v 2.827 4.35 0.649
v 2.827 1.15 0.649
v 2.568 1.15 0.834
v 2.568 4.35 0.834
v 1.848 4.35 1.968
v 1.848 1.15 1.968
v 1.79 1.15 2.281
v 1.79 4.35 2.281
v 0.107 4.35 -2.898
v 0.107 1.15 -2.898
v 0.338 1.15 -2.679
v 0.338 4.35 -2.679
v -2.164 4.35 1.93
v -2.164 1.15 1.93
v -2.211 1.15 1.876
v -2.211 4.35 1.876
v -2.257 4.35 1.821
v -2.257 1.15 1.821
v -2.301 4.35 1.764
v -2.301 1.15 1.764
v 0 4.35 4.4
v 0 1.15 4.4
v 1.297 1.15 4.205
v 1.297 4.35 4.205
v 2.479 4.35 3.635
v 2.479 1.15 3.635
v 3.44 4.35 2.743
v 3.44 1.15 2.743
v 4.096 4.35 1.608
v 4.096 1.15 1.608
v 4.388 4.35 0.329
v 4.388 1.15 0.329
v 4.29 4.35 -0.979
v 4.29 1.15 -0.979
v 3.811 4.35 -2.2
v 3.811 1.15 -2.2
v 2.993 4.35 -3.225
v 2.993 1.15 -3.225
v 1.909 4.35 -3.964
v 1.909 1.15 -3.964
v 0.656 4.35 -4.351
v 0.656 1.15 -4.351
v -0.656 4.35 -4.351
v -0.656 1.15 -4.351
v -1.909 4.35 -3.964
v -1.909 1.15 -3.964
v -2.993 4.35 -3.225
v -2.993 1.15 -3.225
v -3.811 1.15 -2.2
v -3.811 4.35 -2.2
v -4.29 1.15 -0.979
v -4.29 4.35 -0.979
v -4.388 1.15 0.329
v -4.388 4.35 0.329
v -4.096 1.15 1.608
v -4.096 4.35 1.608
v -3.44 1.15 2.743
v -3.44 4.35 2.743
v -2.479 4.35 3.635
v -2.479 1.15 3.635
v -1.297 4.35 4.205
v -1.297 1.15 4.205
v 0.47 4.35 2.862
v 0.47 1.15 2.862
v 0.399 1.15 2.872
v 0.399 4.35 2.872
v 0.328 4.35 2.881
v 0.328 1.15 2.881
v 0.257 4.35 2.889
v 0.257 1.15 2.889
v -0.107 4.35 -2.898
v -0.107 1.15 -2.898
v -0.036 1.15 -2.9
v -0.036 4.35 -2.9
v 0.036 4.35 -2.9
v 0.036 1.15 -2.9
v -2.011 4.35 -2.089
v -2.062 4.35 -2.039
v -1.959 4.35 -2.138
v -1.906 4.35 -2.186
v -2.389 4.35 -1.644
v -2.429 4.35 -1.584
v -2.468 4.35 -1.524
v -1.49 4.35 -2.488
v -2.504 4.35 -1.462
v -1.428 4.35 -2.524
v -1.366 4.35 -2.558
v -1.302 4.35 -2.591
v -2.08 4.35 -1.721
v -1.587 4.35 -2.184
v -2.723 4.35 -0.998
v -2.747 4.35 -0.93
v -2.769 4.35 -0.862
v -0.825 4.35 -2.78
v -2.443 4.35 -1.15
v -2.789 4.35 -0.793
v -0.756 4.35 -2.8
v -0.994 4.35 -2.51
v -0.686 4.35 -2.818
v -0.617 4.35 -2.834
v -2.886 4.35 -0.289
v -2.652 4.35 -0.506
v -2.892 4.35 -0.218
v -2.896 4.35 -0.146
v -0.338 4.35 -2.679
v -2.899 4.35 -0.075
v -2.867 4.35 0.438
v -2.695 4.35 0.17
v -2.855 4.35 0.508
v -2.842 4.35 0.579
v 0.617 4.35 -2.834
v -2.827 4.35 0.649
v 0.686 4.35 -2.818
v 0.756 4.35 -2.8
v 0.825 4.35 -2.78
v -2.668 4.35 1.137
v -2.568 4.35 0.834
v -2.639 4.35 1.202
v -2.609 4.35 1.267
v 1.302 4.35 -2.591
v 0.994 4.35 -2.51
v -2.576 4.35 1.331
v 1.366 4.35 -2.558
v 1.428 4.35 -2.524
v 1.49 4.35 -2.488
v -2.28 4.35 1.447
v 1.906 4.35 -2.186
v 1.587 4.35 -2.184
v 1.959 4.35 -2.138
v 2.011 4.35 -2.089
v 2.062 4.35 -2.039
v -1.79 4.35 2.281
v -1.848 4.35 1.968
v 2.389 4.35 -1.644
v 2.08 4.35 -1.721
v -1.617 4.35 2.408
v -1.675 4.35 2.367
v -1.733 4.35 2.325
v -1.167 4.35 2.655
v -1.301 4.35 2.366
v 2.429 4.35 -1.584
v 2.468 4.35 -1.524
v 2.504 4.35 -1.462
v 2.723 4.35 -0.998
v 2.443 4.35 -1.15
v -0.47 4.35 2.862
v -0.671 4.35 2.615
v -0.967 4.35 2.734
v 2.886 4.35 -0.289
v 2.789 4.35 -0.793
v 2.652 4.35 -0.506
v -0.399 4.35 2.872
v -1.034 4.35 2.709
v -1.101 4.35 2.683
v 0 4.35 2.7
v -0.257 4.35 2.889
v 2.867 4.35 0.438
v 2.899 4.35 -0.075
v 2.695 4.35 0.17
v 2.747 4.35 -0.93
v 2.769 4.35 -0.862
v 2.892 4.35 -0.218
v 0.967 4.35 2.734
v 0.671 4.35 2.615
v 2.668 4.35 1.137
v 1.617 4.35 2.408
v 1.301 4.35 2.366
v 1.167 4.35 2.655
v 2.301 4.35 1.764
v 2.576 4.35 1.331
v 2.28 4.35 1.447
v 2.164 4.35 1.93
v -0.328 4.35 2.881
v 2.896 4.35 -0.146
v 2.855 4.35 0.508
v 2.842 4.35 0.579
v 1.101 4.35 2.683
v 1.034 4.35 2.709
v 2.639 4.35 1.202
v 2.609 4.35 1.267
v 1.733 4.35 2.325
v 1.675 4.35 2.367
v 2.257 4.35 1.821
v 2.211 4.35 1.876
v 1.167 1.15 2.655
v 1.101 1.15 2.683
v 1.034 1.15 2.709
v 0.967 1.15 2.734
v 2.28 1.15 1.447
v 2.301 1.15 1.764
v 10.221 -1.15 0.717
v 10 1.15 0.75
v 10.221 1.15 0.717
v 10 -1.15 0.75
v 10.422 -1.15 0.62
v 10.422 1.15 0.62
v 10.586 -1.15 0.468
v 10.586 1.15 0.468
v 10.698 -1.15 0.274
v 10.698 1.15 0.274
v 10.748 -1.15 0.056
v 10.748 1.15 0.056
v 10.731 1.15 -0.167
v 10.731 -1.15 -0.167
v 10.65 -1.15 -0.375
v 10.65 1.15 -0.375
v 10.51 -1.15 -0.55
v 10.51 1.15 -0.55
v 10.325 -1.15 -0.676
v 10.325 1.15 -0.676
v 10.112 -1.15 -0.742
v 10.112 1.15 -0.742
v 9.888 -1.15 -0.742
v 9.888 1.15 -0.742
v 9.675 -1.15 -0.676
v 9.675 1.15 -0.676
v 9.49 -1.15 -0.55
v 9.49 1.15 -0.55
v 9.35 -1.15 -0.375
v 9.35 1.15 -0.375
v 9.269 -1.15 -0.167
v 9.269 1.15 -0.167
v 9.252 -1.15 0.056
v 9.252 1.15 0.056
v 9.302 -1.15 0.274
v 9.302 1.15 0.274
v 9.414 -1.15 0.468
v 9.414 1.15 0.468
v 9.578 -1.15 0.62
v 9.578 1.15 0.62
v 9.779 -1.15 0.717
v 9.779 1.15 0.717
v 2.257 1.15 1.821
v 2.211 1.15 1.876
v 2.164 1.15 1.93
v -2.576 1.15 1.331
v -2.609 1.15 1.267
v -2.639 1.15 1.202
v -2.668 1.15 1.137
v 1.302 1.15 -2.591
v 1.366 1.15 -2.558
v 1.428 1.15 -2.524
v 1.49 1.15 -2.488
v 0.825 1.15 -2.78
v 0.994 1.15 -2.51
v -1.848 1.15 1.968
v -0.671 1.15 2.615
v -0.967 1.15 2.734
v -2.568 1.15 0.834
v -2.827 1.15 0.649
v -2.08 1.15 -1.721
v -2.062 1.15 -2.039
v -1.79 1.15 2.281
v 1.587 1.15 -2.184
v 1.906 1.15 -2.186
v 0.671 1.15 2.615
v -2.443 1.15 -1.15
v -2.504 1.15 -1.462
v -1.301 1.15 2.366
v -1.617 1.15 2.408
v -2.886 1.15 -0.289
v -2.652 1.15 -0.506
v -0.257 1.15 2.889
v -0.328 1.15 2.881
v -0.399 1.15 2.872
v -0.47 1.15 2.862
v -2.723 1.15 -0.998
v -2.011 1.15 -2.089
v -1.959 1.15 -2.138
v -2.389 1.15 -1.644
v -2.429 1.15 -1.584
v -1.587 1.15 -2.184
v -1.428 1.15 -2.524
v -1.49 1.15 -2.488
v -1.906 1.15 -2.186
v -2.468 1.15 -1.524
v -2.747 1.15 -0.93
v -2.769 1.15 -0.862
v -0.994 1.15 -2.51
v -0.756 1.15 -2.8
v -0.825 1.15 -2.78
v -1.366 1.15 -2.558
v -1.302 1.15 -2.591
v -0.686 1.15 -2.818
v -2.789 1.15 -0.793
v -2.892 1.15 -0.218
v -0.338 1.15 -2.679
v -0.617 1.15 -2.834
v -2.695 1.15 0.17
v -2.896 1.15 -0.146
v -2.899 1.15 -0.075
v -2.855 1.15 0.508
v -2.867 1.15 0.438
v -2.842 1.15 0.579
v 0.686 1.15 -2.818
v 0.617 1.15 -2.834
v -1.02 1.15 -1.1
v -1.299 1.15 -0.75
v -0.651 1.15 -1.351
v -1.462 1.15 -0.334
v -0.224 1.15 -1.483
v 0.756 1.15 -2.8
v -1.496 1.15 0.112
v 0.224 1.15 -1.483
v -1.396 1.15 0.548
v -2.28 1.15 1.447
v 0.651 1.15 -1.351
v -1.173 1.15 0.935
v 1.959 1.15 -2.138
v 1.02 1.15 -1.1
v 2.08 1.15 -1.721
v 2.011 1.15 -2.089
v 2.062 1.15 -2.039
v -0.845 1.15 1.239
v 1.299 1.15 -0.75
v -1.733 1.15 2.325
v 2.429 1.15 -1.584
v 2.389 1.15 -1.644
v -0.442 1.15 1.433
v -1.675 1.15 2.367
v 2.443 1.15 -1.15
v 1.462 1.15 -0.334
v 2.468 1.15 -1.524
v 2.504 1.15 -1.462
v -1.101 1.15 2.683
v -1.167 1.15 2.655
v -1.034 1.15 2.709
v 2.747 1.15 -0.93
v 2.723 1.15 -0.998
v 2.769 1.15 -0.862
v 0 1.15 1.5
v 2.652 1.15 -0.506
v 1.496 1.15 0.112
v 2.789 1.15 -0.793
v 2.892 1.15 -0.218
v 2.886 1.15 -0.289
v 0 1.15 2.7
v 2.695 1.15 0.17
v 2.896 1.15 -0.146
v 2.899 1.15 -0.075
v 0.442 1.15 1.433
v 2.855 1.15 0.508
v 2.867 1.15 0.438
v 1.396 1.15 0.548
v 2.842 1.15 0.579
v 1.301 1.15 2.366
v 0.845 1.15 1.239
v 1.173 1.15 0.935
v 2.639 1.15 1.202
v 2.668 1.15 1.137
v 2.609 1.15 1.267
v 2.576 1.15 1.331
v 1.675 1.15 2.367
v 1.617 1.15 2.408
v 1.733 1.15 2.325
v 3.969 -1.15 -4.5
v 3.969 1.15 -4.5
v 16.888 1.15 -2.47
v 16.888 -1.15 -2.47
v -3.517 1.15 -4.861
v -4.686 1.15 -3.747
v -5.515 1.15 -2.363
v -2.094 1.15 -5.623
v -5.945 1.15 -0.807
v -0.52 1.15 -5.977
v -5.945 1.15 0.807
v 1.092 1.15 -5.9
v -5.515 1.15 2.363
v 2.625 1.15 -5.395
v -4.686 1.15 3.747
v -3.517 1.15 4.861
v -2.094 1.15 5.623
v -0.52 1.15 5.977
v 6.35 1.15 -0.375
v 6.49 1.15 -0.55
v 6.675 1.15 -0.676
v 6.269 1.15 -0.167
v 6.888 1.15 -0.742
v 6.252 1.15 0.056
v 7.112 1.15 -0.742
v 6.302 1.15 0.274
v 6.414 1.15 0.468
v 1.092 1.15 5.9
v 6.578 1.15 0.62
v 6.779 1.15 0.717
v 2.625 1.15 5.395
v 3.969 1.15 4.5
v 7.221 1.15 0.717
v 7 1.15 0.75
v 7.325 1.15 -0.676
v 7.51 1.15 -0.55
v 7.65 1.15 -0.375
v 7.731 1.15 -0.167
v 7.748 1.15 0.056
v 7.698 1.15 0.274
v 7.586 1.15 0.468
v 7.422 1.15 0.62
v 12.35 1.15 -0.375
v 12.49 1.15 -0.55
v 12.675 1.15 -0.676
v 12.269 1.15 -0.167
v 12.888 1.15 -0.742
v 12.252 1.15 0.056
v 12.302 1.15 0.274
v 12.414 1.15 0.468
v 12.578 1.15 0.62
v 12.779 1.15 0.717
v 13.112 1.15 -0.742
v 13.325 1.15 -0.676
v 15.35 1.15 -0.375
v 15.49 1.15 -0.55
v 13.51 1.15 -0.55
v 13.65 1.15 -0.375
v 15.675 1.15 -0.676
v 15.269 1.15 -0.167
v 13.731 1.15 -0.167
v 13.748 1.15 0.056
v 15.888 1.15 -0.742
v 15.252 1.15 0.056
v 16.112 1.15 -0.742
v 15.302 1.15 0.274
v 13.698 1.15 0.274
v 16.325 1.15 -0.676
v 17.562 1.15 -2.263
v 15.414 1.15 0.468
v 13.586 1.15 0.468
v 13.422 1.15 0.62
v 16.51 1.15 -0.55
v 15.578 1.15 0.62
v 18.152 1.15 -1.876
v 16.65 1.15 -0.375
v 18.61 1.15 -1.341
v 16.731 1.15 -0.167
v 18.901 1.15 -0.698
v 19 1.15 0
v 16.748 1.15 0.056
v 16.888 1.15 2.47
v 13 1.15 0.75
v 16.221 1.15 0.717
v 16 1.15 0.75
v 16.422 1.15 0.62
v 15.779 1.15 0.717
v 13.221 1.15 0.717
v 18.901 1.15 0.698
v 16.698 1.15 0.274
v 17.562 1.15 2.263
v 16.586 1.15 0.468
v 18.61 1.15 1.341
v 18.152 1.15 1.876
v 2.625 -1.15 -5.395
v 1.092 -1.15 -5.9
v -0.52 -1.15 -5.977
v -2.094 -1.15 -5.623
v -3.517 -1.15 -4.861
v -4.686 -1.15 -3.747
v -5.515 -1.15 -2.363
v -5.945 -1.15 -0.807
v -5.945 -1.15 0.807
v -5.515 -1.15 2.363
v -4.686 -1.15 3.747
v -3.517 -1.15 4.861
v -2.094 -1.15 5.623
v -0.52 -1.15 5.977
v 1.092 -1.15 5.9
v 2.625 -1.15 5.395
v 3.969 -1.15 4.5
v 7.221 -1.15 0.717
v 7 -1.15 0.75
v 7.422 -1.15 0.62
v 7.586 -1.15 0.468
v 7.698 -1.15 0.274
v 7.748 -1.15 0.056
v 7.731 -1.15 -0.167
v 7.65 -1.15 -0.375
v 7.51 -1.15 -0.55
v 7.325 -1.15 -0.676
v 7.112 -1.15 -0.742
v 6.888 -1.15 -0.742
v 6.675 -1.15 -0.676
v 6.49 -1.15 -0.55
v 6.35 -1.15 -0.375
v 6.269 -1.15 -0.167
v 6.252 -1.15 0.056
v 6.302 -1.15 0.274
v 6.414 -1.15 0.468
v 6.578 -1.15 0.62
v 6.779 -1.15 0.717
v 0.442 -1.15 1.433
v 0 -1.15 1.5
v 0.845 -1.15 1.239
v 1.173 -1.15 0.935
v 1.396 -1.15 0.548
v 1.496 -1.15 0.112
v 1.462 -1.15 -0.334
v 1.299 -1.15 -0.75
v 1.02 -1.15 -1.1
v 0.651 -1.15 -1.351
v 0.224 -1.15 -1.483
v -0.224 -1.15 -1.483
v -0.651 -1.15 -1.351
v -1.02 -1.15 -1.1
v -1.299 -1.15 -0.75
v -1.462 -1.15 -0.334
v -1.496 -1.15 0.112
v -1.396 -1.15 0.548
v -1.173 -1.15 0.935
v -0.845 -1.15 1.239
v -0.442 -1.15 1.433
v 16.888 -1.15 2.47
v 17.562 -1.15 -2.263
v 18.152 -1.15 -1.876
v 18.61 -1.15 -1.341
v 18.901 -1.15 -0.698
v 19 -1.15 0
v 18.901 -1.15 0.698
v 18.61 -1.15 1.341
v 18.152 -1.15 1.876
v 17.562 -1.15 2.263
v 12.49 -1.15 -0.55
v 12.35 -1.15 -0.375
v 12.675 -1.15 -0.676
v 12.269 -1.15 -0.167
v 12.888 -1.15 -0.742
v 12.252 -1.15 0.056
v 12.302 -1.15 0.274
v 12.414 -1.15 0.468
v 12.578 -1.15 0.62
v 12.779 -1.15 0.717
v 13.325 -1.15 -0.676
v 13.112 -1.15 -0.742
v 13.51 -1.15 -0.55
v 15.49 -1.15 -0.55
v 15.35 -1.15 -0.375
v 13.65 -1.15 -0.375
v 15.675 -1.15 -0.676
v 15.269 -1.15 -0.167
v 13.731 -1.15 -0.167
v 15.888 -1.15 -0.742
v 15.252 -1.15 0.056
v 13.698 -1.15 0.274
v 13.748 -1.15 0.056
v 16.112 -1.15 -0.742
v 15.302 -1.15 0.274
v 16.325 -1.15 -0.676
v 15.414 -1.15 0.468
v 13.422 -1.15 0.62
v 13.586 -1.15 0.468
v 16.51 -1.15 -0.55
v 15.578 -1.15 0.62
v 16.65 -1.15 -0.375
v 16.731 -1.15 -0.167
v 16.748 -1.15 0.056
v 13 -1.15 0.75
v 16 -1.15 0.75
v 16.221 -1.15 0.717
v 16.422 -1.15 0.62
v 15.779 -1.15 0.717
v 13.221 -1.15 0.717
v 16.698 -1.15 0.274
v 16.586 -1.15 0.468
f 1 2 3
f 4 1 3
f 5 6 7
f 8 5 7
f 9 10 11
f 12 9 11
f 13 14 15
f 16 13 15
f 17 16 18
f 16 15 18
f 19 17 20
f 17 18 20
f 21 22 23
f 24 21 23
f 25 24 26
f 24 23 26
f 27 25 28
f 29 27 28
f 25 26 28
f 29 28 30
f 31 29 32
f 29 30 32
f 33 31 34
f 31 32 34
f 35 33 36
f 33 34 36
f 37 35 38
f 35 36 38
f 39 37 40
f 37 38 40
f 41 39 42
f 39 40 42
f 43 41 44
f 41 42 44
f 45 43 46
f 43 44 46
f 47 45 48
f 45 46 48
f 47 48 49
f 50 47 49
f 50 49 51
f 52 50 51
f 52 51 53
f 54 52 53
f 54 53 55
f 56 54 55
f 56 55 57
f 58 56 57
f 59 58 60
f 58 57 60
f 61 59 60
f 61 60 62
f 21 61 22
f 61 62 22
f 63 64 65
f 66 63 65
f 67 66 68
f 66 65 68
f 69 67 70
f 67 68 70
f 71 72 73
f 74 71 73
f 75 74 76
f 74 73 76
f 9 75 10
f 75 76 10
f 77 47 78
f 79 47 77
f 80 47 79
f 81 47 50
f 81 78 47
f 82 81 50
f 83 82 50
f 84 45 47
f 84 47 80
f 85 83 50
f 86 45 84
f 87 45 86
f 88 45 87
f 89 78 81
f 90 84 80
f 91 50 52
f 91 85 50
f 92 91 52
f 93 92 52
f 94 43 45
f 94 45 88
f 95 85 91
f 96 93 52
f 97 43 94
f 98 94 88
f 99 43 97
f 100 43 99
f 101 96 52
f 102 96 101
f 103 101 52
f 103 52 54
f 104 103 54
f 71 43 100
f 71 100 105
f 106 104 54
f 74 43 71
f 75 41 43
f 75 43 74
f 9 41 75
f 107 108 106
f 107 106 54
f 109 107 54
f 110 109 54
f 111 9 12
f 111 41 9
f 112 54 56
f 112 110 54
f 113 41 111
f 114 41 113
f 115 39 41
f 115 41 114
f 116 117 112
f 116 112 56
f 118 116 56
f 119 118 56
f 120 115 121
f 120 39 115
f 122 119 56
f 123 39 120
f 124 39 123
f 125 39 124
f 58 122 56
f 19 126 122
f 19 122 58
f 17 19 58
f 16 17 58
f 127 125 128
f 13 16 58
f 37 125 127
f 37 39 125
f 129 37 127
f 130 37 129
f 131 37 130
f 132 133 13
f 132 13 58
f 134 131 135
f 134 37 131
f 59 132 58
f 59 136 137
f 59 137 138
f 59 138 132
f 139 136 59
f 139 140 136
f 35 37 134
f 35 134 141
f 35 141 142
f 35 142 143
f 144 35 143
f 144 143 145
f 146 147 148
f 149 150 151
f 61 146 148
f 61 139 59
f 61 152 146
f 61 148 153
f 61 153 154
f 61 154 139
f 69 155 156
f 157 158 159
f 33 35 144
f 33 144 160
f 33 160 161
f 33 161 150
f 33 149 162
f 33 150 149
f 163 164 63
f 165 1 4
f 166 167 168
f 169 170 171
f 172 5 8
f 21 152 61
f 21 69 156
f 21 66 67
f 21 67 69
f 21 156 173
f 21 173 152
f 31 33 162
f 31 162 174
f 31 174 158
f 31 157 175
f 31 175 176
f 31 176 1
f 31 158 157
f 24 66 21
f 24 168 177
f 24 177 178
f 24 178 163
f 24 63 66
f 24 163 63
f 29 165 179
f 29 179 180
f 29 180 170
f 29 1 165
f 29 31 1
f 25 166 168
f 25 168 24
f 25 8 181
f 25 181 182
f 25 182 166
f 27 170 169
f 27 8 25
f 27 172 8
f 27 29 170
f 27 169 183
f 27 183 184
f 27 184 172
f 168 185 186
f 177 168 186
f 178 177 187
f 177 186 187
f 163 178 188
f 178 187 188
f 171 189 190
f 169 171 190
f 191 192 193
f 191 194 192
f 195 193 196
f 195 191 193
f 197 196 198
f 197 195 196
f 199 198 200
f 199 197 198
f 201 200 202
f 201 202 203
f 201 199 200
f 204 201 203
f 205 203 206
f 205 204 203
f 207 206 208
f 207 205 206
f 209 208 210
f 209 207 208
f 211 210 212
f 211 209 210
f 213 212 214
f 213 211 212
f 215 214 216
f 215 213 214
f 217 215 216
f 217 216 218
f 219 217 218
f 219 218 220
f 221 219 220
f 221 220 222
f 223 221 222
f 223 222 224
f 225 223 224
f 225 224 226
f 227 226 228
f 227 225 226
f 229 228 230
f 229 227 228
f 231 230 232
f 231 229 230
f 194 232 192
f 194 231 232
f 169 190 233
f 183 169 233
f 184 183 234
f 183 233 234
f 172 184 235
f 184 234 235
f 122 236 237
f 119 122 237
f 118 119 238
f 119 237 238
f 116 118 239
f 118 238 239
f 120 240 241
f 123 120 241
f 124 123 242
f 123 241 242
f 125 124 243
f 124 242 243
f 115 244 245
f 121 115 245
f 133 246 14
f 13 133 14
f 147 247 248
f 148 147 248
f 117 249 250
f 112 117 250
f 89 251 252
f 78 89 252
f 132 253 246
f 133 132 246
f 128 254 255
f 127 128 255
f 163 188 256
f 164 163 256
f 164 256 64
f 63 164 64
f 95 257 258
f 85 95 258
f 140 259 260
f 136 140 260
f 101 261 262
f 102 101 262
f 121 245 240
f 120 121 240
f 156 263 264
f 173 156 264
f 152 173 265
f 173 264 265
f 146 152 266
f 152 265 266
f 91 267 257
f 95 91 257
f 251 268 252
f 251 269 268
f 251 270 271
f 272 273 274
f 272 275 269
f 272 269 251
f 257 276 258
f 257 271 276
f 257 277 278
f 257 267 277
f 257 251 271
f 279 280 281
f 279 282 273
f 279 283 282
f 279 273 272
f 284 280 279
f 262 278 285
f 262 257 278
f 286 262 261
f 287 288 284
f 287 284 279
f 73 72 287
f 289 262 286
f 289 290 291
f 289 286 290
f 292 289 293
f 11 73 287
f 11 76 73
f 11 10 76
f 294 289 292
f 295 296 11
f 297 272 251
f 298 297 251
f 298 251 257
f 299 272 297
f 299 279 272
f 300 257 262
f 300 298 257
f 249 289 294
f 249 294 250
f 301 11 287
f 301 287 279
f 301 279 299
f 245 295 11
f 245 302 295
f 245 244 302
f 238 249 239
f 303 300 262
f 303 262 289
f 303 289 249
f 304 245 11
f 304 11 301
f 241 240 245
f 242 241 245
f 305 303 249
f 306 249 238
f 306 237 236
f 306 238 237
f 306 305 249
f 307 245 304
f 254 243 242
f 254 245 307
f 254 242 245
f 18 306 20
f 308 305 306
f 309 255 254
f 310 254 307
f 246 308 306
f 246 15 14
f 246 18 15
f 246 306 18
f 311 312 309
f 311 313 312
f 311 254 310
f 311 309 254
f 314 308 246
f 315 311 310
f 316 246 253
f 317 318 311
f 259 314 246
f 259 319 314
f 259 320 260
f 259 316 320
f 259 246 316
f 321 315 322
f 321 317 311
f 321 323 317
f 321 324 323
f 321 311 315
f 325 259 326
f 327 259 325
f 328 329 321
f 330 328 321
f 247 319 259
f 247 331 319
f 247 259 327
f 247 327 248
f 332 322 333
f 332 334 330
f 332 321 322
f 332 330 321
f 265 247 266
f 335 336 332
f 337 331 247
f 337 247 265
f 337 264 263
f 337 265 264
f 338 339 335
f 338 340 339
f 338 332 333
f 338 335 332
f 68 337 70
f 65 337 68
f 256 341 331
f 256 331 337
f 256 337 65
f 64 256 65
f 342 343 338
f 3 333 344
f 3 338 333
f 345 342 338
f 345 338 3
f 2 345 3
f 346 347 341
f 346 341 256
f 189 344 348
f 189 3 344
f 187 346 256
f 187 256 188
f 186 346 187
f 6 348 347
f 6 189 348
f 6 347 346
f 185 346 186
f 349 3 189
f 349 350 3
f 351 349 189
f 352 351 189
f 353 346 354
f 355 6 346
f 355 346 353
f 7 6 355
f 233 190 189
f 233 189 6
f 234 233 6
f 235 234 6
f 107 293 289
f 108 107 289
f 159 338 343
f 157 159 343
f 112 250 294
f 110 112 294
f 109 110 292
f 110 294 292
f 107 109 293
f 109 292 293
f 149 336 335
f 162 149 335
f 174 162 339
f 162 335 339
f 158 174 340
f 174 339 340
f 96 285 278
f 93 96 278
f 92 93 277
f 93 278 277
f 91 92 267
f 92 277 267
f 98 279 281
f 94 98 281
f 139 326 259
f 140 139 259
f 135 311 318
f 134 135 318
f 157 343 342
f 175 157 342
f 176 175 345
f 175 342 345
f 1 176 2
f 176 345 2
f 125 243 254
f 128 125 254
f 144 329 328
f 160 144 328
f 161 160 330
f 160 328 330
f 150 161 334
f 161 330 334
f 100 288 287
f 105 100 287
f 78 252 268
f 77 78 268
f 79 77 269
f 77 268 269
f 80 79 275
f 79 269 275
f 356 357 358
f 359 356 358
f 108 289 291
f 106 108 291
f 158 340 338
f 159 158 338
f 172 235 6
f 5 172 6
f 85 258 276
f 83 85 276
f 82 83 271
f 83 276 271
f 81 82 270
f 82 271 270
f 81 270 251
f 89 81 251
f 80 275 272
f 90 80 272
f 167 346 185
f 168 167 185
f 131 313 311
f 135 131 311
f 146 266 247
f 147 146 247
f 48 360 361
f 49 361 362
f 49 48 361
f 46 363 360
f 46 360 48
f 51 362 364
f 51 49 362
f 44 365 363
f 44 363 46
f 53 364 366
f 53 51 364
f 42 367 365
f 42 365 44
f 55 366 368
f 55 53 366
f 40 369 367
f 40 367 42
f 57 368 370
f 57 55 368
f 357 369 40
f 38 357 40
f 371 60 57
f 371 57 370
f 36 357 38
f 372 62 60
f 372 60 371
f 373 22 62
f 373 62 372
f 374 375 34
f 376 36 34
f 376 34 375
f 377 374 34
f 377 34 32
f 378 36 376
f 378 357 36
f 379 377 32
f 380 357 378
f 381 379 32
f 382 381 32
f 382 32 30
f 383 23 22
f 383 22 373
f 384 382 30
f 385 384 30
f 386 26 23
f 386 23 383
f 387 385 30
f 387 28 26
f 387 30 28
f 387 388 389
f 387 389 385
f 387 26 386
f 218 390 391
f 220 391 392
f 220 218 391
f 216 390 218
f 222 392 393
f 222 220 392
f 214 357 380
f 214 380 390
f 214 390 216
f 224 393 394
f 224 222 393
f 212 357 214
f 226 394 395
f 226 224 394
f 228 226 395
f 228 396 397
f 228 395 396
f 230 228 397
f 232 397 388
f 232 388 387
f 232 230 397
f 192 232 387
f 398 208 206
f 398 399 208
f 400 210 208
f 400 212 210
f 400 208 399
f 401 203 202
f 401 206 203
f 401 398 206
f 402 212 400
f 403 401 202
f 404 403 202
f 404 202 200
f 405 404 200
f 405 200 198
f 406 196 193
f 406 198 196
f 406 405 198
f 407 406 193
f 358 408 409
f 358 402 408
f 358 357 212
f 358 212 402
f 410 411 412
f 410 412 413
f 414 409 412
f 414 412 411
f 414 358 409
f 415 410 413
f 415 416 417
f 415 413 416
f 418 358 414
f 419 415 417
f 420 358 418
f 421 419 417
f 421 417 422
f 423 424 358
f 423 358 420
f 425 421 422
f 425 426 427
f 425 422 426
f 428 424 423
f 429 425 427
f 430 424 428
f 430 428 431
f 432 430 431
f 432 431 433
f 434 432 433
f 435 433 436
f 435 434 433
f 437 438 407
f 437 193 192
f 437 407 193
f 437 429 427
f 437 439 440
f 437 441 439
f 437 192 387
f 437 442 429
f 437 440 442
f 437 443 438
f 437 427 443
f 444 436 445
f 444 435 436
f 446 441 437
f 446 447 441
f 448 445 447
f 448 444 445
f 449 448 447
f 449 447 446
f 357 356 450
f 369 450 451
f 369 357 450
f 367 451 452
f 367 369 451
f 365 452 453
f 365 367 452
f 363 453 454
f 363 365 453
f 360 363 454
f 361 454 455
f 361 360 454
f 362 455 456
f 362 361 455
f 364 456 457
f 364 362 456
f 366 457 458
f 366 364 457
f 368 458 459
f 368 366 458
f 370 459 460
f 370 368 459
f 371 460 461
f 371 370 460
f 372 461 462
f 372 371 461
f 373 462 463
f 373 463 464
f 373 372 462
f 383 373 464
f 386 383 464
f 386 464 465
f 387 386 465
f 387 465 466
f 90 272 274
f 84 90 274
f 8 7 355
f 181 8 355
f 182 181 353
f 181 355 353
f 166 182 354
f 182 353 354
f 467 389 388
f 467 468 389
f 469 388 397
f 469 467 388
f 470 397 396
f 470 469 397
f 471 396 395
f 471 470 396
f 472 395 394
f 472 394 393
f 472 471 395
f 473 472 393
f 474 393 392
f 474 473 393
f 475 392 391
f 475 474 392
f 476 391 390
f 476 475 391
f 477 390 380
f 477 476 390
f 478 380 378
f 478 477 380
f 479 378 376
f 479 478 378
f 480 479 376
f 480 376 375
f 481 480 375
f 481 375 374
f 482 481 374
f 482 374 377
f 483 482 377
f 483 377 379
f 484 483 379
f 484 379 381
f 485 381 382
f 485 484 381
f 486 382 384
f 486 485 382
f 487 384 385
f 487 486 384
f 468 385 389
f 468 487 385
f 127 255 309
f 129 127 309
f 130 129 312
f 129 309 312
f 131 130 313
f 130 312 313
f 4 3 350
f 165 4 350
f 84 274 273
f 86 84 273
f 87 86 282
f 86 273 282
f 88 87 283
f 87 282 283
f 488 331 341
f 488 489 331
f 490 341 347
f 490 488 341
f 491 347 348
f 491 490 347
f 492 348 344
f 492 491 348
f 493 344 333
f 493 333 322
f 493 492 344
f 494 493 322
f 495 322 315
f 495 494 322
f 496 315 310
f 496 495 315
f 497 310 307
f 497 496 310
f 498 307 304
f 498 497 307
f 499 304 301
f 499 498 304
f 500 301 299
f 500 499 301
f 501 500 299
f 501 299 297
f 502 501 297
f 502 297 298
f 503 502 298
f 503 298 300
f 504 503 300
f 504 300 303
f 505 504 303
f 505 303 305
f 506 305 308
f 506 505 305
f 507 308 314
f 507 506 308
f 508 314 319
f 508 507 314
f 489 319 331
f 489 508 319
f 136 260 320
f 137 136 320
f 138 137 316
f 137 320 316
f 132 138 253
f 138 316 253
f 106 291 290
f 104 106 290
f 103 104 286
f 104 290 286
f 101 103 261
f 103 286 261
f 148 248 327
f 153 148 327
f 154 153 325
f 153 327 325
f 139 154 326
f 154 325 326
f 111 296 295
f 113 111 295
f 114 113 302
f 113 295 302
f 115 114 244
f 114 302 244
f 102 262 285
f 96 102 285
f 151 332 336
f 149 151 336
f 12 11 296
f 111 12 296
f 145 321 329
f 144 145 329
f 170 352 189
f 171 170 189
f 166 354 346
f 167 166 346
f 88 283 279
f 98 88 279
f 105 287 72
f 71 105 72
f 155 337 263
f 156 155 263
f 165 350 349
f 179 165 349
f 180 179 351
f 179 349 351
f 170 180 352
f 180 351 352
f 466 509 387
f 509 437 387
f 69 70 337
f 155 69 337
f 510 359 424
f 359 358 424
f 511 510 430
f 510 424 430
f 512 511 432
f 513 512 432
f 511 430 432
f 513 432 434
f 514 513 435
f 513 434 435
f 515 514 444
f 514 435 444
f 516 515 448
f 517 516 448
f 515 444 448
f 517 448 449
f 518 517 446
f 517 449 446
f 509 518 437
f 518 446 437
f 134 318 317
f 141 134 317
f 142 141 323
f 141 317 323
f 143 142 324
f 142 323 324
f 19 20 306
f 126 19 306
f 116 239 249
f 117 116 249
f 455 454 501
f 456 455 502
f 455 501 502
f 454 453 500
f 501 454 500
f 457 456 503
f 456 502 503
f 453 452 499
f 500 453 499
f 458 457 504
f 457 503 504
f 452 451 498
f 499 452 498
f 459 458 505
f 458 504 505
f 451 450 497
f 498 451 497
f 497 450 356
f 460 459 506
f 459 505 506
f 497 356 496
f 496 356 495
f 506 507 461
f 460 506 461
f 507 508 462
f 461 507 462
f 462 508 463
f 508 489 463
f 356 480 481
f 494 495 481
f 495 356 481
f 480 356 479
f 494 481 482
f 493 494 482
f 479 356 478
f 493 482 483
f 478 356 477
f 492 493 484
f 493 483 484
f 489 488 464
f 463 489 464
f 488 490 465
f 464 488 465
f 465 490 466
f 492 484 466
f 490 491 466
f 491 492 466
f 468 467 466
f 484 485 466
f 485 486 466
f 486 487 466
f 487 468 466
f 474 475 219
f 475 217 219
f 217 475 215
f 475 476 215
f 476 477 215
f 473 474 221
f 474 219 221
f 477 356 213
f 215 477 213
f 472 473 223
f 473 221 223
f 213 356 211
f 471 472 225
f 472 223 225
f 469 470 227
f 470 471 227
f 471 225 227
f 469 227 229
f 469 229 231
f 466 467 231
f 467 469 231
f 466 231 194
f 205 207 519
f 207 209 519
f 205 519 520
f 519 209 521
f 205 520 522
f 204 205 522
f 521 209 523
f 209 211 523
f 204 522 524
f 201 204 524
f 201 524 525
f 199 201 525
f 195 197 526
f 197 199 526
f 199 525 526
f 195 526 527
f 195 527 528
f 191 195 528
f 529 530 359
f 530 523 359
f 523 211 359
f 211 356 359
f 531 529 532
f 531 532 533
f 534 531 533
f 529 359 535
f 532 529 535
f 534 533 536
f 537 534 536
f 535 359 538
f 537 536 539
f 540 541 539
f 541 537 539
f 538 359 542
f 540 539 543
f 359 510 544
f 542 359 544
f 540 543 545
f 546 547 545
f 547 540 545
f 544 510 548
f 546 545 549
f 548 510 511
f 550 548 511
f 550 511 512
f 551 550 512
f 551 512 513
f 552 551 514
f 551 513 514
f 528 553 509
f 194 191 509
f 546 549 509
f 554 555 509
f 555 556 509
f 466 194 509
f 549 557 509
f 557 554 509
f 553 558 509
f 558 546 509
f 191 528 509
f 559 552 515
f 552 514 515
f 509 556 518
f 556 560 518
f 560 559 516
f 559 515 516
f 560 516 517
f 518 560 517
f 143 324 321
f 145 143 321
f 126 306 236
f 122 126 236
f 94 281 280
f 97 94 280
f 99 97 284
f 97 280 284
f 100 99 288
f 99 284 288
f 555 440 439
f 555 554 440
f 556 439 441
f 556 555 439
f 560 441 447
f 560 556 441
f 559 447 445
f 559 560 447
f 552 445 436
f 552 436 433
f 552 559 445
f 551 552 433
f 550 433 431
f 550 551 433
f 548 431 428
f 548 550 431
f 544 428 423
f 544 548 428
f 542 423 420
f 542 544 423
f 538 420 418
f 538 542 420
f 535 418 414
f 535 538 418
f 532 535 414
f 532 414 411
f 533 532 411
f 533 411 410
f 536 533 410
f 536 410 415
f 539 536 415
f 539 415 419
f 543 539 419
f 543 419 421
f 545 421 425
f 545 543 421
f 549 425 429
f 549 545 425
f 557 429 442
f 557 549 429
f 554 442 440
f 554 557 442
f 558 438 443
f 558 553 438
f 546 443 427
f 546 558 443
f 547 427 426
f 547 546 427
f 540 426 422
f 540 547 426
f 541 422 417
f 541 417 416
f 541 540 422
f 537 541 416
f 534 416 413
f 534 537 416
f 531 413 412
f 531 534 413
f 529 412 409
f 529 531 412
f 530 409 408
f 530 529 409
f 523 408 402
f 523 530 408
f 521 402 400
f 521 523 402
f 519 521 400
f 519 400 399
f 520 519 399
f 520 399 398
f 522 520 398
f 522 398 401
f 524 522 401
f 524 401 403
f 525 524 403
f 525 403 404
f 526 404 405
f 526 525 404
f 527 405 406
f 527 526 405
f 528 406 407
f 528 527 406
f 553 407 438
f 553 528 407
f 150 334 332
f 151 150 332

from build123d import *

# Parameters (mm, degrees)
SKETCH2_R           = 6
SKETCH2_R_2         = 1.5
BOSS_EXTRUDE1_DEPTH = 1.15
SKETCH3_R           = 4.4
BOSS_EXTRUDE2_DEPTH = 3.2
SKETCH4_R           = 0.75
BOSS_EXTRUDE3_DEPTH = 1.15


with BuildPart() as part:
    # Sketch2 → Boss-Extrude1 (new, symmetric)
    with BuildSketch(Plane(origin=(0, 0, 0), x_dir=(1, 0, 0), z_dir=(0, 1, 0))):
        with Locations(Location((0, 0, 0), (0, 0, 270))):
            Circle(SKETCH2_R)
        with Locations(Location((0, 0, 0), (0, 0, 270))):
            Circle(SKETCH2_R_2, mode=Mode.SUBTRACT)
    extrude(amount=BOSS_EXTRUDE1_DEPTH, both=True)

    # Sketch3 → Boss-Extrude2 (add)
    with BuildSketch(Plane(origin=(0, 1.15, 0), x_dir=(1, 0, 0), z_dir=(0, 1, 0))):
        with Locations(Location((0, 0, 0), (0, 0, 270))):
            Circle(SKETCH3_R)
        with BuildLine():
            Line((0.107421435, 2.898009771), (0.338399731, 2.678709694))
            Line((0.338399731, 2.678709694), (0.61665913, 2.83367809))
            ThreePointArc((0.61665913, 2.83367809), (0.721200673, 2.808891167), (0.824752316, 2.780248841))
            Line((0.824752316, 2.780248841), (0.993936292, 2.510396512))
            Line((0.993936292, 2.510396512), (1.301992734, 2.591295993))
            ThreePointArc((1.301992734, 2.591295993), (1.397085655, 2.541289372), (1.490260976, 2.48779465))
            Line((1.490260976, 2.48779465), (1.587020181, 2.184345885))
            Line((1.587020181, 2.184345885), (1.905517346, 2.186093238))
            ThreePointArc((1.905517346, 2.186093238), (1.985186607, 2.11400902), (2.062131058, 2.039023173))
            Line((2.062131058, 2.039023173), (2.080385755, 1.721044772))
            Line((2.080385755, 1.721044772), (2.389311295, 1.643530205))
            ThreePointArc((2.389311295, 1.643530205), (2.448550984, 1.553897705), (2.504429862, 1.46213237))
            Line((2.504429862, 1.46213237), (2.443033042, 1.149604087))
            Line((2.443033042, 1.149604087), (2.722976028, 0.997698125))
            ThreePointArc((2.722976028, 0.997698125), (2.758063897, 0.896149284), (2.789366126, 0.793370413))
            Line((2.789366126, 0.793370413), (2.652175577, 0.505929549))
            Line((2.652175577, 0.505929549), (2.885546163, 0.289177003))
            ThreePointArc((2.885546163, 0.289177003), (2.894277512, 0.182092507), (2.899036259, 0.074758075))
            Line((2.899036259, 0.074758075), (2.694672167, -0.169534403))
            Line((2.694672167, -0.169534403), (2.866806821, -0.437514174))
            ThreePointArc((2.866806821, -0.437514174), (2.848633027, -0.543405812), (2.826549281, -0.648551587))
            Line((2.826549281, -0.648551587), (2.567852594, -0.834345885))
            Line((2.567852594, -0.834345885), (2.667935462, -1.136714727))
            ThreePointArc((2.667935462, -1.136714727), (2.623998452, -1.234759946), (2.576459817, -1.331110368))
            Line((2.576459817, -1.331110368), (2.279685399, -1.446732346))
            Line((2.279685399, -1.446732346), (2.301427906, -1.764491312))
            ThreePointArc((2.301427906, -1.764491312), (2.234488404, -1.84852957), (2.164481907, -1.930030589))
            Line((2.164481907, -1.930030589), (1.848277186, -1.968215294))
            Line((1.848277186, -1.968215294), (1.790313171, -2.281398419))
            ThreePointArc((1.790313171, -2.281398419), (1.704577232, -2.346149284), (1.616501638, -2.40767989))
            Line((1.616501638, -2.40767989), (1.30073492, -2.366028036))
            Line((1.30073492, -2.366028036), (1.166706475, -2.654956874))
            ThreePointArc((1.166706475, -2.654956874), (1.067561203, -2.696351809), (0.966950626, -2.734045809))
            Line((0.966950626, -2.734045809), (0.671462695, -2.615174535))
            Line((0.671462695, -2.615174535), (0.469791321, -2.861694623))
            ThreePointArc((0.469791321, -2.861694623), (0.363466377, -2.877132634), (0.25664255, -2.888621575))
            Line((0.25664255, -2.888621575), (0, -2.7))
            Line((0, -2.7), (-0.25664255, -2.888621575))
            ThreePointArc((-0.25664255, -2.888621575), (-0.363466377, -2.877132634), (-0.469791321, -2.861694623))
            Line((-0.469791321, -2.861694623), (-0.671462695, -2.615174535))
            Line((-0.671462695, -2.615174535), (-0.966950626, -2.734045809))
            ThreePointArc((-0.966950626, -2.734045809), (-1.067561203, -2.696351809), (-1.166706475, -2.654956874))
            Line((-1.166706475, -2.654956874), (-1.30073492, -2.366028036))
            Line((-1.30073492, -2.366028036), (-1.616501638, -2.40767989))
            ThreePointArc((-1.616501638, -2.40767989), (-1.704577232, -2.346149284), (-1.790313171, -2.281398419))
            Line((-1.790313171, -2.281398419), (-1.848277186, -1.968215294))
            Line((-1.848277186, -1.968215294), (-2.164481907, -1.930030589))
            ThreePointArc((-2.164481907, -1.930030589), (-2.234488404, -1.84852957), (-2.301427906, -1.764491312))
            Line((-2.301427906, -1.764491312), (-2.279685399, -1.446732346))
            Line((-2.279685399, -1.446732346), (-2.576459817, -1.331110368))
            ThreePointArc((-2.576459817, -1.331110368), (-2.623998452, -1.234759946), (-2.667935462, -1.136714727))
            Line((-2.667935462, -1.136714727), (-2.567852594, -0.834345885))
            Line((-2.567852594, -0.834345885), (-2.826549281, -0.648551587))
            ThreePointArc((-2.826549281, -0.648551587), (-2.848633027, -0.543405812), (-2.866806821, -0.437514174))
            Line((-2.866806821, -0.437514174), (-2.694672167, -0.169534403))
            Line((-2.694672167, -0.169534403), (-2.899036259, 0.074758075))
            ThreePointArc((-2.899036259, 0.074758075), (-2.894277512, 0.182092507), (-2.885546163, 0.289177003))
            Line((-2.885546163, 0.289177003), (-2.652175577, 0.505929549))
            Line((-2.652175577, 0.505929549), (-2.789366126, 0.793370413))
            ThreePointArc((-2.789366126, 0.793370413), (-2.758063897, 0.896149284), (-2.722976028, 0.997698125))
            Line((-2.722976028, 0.997698125), (-2.443033042, 1.149604087))
            Line((-2.443033042, 1.149604087), (-2.504429862, 1.46213237))
            ThreePointArc((-2.504429862, 1.46213237), (-2.448550984, 1.553897705), (-2.389311295, 1.643530205))
            Line((-2.389311295, 1.643530205), (-2.080385755, 1.721044772))
            Line((-2.080385755, 1.721044772), (-2.062131058, 2.039023173))
            ThreePointArc((-2.062131058, 2.039023173), (-1.985186607, 2.11400902), (-1.905517346, 2.186093238))
            Line((-1.905517346, 2.186093238), (-1.587020181, 2.184345885))
            Line((-1.587020181, 2.184345885), (-1.490260976, 2.48779465))
            ThreePointArc((-1.490260976, 2.48779465), (-1.397085655, 2.541289372), (-1.301992734, 2.591295993))
            Line((-1.301992734, 2.591295993), (-0.993936292, 2.510396512))
            Line((-0.993936292, 2.510396512), (-0.824752316, 2.780248841))
            ThreePointArc((-0.824752316, 2.780248841), (-0.721200673, 2.808891167), (-0.61665913, 2.83367809))
            Line((-0.61665913, 2.83367809), (-0.338399731, 2.678709694))
            Line((-0.338399731, 2.678709694), (-0.107421435, 2.898009771))
            ThreePointArc((-0.107421435, 2.898009771), (0, 2.9), (0.107421435, 2.898009771))
        make_face(mode=Mode.SUBTRACT)
    extrude(amount=BOSS_EXTRUDE2_DEPTH)

    # Sketch4 → Boss-Extrude3 (add, symmetric)
    with BuildSketch(Plane(origin=(0, 0, 0), x_dir=(1, 0, 0), z_dir=(0, 1, 0))):
        with BuildLine():
            Line((3.968626967, 4.5), (16.888114198, 2.469689731))
            ThreePointArc((16.888114198, 2.469689731), (19, 0), (16.888114198, -2.469689731))
            Line((16.888114198, -2.469689731), (3.968626967, -4.5))
            ThreePointArc((3.968626967, -4.5), (6, 0), (3.968626967, 4.5))
        make_face()
        with Locations(Location((16, 0, 0), (0, 0, 270))):
            Circle(SKETCH4_R, mode=Mode.SUBTRACT)
        with Locations(Location((13, 0, 0), (0, 0, 270))):
            Circle(SKETCH4_R, mode=Mode.SUBTRACT)
        with Locations(Location((10, 0, 0), (0, 0, 270))):
            Circle(SKETCH4_R, mode=Mode.SUBTRACT)
        with Locations(Location((7, 0, 0), (0, 0, 270))):
            Circle(SKETCH4_R, mode=Mode.SUBTRACT)
    extrude(amount=BOSS_EXTRUDE3_DEPTH, both=True)


solid = part.part
